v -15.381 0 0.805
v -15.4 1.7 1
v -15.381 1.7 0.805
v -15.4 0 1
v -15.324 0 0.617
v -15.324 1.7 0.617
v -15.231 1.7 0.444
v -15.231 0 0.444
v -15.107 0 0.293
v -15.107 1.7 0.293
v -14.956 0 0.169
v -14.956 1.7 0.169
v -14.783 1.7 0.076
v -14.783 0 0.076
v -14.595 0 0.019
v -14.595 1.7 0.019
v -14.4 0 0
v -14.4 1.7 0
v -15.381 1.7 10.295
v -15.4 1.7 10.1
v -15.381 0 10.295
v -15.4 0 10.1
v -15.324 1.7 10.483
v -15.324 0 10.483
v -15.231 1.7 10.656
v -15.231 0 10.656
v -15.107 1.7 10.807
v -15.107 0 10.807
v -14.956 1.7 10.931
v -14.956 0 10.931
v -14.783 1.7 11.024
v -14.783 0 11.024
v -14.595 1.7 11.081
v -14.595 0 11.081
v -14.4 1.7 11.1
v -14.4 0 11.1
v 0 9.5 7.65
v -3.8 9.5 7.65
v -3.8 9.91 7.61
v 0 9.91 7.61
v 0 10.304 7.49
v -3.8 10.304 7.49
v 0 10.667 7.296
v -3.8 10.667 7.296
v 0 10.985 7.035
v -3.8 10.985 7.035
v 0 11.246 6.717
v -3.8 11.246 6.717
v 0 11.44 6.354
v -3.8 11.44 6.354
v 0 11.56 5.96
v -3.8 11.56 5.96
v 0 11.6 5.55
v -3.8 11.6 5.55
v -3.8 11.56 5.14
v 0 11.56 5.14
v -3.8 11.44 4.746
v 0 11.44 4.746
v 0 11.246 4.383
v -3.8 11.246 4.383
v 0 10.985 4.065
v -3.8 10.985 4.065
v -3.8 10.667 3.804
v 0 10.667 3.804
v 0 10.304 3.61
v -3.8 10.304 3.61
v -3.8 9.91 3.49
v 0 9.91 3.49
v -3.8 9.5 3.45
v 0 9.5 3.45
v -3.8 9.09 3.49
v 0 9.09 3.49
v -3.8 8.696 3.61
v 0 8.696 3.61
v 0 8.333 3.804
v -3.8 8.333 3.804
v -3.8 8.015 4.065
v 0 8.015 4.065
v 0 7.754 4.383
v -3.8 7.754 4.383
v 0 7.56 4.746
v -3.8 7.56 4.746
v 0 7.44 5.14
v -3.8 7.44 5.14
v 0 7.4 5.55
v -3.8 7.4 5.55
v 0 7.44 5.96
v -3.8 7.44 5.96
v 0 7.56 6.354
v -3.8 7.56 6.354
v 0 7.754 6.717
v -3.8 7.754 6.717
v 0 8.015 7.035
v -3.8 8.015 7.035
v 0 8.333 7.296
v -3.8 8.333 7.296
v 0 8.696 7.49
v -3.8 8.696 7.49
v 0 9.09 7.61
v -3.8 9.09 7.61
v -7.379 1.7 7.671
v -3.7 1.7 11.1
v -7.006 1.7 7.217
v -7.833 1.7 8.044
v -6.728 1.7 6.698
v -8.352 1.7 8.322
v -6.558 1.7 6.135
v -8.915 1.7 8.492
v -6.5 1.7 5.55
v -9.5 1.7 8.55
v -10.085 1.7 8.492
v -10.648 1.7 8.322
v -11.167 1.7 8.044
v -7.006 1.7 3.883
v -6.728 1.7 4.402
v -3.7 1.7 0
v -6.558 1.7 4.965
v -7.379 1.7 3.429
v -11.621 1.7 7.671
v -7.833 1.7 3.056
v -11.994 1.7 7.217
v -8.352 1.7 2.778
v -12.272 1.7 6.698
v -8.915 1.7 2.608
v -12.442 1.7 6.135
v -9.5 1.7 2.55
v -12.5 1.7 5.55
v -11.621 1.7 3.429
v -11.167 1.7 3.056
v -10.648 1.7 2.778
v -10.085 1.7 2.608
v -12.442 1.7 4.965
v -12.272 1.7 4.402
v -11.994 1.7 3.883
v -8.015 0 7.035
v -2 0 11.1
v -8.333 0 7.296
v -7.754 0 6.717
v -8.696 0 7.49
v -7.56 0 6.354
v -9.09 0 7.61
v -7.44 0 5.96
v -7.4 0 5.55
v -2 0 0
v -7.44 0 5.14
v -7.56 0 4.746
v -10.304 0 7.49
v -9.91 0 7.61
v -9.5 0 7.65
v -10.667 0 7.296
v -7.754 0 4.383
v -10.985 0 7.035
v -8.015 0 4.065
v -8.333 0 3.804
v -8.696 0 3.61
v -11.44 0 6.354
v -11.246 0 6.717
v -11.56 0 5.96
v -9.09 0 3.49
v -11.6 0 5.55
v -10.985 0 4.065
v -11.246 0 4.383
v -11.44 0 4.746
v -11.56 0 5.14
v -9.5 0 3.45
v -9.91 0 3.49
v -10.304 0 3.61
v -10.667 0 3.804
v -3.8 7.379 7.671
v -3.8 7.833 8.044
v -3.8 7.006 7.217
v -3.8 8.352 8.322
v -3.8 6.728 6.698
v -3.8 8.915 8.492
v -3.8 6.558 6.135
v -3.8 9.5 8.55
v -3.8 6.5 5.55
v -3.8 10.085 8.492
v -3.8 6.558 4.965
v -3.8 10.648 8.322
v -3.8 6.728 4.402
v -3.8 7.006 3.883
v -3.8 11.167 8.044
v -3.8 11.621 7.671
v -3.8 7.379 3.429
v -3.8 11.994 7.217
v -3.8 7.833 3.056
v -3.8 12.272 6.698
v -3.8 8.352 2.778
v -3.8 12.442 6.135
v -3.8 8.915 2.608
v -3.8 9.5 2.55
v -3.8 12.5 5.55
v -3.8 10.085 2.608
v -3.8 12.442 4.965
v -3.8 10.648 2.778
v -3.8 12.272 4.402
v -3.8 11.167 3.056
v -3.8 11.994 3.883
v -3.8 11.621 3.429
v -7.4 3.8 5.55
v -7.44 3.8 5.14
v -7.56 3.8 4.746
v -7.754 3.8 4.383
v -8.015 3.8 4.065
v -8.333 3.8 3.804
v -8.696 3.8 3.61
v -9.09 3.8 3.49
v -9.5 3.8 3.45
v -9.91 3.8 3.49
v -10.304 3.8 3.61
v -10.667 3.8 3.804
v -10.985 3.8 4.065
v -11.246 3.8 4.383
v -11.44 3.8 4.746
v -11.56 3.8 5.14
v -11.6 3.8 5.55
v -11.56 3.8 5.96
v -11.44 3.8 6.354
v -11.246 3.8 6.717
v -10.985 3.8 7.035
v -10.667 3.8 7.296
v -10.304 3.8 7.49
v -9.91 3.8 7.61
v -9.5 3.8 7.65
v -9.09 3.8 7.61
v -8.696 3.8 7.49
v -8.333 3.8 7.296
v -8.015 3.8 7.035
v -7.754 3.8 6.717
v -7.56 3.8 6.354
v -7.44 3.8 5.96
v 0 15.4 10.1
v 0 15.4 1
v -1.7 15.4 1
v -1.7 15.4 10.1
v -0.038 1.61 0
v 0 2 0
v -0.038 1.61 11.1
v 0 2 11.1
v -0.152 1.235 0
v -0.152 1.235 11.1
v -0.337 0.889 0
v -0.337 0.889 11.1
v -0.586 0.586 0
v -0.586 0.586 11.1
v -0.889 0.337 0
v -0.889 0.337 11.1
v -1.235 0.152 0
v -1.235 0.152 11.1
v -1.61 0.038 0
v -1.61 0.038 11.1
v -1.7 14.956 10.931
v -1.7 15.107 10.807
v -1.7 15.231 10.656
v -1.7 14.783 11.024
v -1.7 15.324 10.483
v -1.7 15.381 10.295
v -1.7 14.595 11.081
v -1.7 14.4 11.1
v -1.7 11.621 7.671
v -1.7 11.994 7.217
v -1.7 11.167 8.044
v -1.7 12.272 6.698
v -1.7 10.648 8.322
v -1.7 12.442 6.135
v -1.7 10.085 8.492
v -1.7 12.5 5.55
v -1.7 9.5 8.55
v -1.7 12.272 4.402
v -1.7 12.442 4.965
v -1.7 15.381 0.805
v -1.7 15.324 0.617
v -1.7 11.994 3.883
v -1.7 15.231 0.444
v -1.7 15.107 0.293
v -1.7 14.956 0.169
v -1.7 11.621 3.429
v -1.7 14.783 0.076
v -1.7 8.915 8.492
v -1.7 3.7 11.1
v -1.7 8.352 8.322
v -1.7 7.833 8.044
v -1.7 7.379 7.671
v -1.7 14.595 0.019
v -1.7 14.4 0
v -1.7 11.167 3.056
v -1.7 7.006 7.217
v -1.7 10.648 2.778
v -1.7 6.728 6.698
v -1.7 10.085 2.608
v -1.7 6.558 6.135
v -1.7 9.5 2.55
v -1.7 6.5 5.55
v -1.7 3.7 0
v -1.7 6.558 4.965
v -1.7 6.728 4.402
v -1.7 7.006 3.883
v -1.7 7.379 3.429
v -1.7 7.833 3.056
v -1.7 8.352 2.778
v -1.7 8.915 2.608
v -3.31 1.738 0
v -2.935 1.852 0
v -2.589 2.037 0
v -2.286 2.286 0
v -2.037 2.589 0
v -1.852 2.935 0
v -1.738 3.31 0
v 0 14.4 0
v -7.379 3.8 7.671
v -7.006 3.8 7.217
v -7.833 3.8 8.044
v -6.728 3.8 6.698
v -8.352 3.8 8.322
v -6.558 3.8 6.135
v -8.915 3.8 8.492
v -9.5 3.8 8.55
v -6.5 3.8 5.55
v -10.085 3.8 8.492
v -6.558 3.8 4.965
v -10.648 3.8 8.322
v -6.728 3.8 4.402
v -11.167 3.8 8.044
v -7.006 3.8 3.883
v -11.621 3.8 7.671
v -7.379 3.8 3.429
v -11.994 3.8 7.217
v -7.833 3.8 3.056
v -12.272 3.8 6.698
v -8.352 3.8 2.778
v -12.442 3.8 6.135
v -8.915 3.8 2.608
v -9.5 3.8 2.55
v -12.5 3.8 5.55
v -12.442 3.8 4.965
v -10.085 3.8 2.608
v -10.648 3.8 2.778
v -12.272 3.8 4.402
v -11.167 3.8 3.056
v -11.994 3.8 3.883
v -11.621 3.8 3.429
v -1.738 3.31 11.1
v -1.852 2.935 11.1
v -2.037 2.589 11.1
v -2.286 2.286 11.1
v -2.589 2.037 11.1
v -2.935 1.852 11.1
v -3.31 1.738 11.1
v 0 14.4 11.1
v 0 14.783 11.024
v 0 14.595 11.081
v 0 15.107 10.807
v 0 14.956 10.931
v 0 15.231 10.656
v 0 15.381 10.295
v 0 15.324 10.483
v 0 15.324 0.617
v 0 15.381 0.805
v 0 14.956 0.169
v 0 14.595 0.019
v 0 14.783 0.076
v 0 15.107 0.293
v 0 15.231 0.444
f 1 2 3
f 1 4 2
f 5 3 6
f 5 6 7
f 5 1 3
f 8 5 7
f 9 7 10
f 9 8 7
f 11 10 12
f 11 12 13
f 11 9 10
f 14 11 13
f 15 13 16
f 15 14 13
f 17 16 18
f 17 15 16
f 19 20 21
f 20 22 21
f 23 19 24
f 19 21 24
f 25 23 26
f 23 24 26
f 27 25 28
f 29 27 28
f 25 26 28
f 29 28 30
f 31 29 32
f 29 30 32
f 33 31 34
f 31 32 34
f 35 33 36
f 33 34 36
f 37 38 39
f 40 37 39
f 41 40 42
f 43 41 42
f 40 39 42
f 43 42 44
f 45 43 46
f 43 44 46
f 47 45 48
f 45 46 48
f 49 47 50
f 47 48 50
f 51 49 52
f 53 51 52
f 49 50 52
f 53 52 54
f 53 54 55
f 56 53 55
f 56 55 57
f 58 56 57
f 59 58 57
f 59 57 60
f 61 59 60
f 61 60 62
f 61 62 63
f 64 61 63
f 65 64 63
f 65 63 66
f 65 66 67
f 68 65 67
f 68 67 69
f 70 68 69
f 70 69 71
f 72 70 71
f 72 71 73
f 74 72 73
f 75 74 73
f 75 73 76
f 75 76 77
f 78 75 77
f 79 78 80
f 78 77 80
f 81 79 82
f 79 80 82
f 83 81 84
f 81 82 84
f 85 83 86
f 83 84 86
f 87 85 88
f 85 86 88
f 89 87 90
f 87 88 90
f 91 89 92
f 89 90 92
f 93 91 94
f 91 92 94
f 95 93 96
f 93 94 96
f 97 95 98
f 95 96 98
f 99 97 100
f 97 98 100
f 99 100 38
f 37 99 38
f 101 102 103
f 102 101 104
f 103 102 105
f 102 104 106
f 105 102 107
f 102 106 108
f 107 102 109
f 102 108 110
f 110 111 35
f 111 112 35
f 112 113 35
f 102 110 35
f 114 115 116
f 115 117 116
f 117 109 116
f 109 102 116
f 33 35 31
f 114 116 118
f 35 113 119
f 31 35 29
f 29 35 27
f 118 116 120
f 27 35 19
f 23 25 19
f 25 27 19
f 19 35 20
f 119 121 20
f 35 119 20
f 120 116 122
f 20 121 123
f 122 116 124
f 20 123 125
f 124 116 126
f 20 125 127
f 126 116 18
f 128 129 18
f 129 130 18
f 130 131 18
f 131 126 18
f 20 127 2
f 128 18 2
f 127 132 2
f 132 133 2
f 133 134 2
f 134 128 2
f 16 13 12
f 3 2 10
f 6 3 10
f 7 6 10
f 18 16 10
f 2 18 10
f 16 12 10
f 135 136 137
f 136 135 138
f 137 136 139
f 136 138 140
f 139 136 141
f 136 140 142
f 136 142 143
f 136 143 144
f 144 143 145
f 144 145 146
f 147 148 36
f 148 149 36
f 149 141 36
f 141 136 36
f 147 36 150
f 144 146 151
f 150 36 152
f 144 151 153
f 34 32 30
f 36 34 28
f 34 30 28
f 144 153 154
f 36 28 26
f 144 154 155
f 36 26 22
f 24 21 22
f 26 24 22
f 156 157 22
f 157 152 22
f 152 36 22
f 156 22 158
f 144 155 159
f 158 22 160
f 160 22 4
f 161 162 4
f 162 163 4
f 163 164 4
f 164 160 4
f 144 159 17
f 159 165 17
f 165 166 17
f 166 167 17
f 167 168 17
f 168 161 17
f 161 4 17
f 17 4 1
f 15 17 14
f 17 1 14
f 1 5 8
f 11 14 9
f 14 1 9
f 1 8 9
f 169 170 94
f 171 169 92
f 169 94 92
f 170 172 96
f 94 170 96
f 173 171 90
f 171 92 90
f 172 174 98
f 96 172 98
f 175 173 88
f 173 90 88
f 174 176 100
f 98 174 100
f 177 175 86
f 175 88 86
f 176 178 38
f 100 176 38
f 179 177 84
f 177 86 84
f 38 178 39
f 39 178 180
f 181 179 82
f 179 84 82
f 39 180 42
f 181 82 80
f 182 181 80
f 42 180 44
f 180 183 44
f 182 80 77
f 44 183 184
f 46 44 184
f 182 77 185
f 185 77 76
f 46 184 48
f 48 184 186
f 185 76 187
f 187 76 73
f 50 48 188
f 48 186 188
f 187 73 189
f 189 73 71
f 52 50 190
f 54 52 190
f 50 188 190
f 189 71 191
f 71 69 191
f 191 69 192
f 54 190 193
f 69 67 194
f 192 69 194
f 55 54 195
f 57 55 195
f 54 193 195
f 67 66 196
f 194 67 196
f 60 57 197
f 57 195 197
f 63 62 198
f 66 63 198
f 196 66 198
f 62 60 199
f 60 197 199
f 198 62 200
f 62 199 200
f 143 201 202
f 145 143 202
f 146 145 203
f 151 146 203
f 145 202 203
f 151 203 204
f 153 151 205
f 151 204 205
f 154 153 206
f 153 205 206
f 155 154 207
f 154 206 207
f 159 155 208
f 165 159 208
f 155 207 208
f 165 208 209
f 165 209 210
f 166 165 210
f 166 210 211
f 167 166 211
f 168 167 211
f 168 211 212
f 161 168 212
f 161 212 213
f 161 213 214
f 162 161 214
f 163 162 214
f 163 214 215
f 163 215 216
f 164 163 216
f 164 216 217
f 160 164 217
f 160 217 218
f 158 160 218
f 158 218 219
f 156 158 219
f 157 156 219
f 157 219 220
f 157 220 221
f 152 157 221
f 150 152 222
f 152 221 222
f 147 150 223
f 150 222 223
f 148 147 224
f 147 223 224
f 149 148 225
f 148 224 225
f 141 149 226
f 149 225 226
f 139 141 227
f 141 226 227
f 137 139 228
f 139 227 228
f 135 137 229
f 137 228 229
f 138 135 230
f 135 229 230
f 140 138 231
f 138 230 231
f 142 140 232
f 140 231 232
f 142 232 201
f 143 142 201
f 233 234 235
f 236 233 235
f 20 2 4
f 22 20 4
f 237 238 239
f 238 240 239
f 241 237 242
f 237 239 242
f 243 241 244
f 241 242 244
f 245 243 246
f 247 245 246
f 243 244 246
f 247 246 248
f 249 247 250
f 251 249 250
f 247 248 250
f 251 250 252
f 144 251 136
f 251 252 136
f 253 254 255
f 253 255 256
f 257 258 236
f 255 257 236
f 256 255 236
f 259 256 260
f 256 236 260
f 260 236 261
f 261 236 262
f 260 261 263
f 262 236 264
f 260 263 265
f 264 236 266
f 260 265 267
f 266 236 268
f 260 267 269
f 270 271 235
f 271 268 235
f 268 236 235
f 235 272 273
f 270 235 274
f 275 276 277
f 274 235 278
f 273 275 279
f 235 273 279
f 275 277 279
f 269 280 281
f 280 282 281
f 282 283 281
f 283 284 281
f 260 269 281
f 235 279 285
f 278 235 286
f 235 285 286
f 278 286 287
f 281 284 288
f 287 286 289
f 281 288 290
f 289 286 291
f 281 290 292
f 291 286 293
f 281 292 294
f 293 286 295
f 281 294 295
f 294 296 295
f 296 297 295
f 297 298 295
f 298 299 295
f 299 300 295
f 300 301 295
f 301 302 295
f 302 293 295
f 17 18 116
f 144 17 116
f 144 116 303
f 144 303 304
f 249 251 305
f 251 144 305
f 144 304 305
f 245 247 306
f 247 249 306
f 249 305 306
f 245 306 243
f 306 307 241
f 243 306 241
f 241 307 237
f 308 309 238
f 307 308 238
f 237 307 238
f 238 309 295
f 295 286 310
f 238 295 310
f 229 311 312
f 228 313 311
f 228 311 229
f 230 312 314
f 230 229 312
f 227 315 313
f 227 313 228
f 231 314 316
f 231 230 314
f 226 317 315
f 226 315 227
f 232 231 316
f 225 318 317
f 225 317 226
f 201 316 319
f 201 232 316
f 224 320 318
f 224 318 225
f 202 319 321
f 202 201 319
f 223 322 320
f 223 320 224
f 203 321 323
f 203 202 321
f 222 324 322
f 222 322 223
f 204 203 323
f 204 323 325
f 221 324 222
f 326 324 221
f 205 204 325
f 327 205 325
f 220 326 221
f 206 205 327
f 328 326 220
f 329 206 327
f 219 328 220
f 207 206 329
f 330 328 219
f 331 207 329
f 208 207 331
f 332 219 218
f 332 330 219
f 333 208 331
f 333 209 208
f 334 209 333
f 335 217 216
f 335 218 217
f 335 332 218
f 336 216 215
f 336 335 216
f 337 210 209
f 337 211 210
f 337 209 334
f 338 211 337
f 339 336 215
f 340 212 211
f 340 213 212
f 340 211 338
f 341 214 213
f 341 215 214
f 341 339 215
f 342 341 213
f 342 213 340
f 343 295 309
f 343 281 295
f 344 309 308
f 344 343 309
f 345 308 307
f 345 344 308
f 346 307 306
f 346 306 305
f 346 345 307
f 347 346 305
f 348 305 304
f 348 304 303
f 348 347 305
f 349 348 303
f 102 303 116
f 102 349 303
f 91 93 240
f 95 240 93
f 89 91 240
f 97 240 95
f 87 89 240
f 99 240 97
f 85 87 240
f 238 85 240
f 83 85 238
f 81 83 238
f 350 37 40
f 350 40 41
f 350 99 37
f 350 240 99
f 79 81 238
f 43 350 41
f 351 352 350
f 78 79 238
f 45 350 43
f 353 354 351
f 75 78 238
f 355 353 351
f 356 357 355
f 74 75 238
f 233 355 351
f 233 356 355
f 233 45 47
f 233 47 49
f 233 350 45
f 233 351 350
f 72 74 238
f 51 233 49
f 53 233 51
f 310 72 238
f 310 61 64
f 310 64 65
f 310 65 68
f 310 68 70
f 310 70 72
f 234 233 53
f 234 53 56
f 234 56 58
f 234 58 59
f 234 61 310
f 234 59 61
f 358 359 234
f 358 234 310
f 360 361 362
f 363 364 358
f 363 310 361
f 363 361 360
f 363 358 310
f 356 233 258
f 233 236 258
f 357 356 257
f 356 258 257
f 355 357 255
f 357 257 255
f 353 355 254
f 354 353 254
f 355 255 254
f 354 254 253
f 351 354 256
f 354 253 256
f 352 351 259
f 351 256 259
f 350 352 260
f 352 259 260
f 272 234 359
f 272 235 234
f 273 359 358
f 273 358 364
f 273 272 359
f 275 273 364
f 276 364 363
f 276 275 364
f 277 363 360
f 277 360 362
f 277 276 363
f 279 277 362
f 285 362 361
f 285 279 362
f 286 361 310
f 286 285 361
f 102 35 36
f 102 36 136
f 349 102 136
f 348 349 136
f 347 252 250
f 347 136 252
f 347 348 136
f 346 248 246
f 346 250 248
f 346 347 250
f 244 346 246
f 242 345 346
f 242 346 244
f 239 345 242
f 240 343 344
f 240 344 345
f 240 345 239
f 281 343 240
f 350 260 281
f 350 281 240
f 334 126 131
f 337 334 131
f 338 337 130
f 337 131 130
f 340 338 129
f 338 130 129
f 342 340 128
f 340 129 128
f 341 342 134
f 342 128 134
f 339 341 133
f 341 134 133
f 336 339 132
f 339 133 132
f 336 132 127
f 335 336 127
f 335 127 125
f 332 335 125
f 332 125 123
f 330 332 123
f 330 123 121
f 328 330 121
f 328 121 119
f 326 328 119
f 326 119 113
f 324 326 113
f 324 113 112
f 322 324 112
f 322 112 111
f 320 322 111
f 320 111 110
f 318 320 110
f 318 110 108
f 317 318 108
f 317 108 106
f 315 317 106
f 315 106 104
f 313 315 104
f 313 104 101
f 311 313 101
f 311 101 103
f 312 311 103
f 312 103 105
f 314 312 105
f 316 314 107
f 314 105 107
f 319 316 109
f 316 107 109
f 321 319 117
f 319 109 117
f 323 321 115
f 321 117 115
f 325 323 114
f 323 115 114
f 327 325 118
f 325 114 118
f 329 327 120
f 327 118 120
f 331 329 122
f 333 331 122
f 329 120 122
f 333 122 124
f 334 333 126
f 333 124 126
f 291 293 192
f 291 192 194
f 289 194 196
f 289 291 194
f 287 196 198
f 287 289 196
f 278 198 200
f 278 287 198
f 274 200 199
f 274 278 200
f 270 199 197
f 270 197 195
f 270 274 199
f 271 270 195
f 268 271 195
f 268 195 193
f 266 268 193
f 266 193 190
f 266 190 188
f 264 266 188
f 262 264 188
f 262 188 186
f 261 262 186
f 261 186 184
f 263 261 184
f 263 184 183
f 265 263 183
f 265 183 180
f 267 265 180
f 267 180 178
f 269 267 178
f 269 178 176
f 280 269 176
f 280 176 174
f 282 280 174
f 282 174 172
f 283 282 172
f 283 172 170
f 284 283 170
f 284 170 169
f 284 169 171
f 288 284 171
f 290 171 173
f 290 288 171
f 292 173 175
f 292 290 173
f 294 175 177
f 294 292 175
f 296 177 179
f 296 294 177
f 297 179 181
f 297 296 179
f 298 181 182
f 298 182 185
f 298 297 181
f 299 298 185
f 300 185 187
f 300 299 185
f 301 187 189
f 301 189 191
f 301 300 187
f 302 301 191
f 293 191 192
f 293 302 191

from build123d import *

# Parameters (mm, degrees)
EXTRUDE_1_DEPTH    = 11.1
FILLET_1_R         = 1
SKETCH_3_R         = 3
EXTRUDE_2_DEPTH    = 3.8
SKETCH_2_R         = 3
EXTRUDE_3_DEPTH    = 3.8
FILLET_2_R         = 2
HOLE_WIZARD_M5_3_D = 4.2
HOLE_WIZARD_M5_4_D = 4.2


with BuildPart() as part:
    # 草图1 → 凸台-拉伸1 (new body)
    with BuildSketch(Plane.XY):
        Polygon((0, 0), (0, 15.4), (-1.7, 15.4), (-1.7, 1.7), (-15.4, 1.7), (-15.4, 0), align=None)
    extrude(amount=EXTRUDE_1_DEPTH)

    # 圆角1
    fillet_1_edges = [part.edges().sort_by_distance(p)[0] for p in [
        (-0.85, 15.4, 11.1),
        (-15.4, 0.85, 11.1),
        (-15.4, 0.85, 0),
        (-0.85, 15.4, 0),
    ]]
    fillet(fillet_1_edges, radius=FILLET_1_R)

    # 草图3 → 凸台-拉伸2 (add)
    with BuildSketch(Plane(origin=(0, 0, 0), x_dir=(1, 0, 0), z_dir=(0, 1, 0))):
        with Locations(Location((-9.5, -5.55, 0), (0, 0, 90))):
            Circle(SKETCH_3_R)
    extrude(amount=EXTRUDE_2_DEPTH)

    # 草图2 → 凸台-拉伸3 (add)
    with BuildSketch(Plane(origin=(0, 0, 0), x_dir=(0, 0, -1), z_dir=(1, 0, 0))):
        with Locations((-5.55, 9.5)):
            Circle(SKETCH_2_R)
    extrude(amount=-EXTRUDE_3_DEPTH)

    # 圆角2
    fillet_2_edges = [part.edges().sort_by_distance(p)[0] for p in [
        (-1.7, 1.7, 5.55),
        (0, 0, 5.55),
    ]]
    fillet(fillet_2_edges, radius=FILLET_2_R)

    # M5 螺纹孔3 (through all)
    with Locations(Plane(origin=(0, 0, 0), x_dir=(0, 0, -1), z_dir=(1, 0, 0))):
        with Locations((-5.55, 9.5)):
            Hole(HOLE_WIZARD_M5_3_D / 2)

    # M5 螺纹孔4 (through all)
    with Locations(Plane(origin=(0, 0, 0), x_dir=(-1, 0, 0), z_dir=(0, -1, 0))):
        with Locations((9.5, -5.55)):
            Hole(HOLE_WIZARD_M5_4_D / 2)


solid = part.part
